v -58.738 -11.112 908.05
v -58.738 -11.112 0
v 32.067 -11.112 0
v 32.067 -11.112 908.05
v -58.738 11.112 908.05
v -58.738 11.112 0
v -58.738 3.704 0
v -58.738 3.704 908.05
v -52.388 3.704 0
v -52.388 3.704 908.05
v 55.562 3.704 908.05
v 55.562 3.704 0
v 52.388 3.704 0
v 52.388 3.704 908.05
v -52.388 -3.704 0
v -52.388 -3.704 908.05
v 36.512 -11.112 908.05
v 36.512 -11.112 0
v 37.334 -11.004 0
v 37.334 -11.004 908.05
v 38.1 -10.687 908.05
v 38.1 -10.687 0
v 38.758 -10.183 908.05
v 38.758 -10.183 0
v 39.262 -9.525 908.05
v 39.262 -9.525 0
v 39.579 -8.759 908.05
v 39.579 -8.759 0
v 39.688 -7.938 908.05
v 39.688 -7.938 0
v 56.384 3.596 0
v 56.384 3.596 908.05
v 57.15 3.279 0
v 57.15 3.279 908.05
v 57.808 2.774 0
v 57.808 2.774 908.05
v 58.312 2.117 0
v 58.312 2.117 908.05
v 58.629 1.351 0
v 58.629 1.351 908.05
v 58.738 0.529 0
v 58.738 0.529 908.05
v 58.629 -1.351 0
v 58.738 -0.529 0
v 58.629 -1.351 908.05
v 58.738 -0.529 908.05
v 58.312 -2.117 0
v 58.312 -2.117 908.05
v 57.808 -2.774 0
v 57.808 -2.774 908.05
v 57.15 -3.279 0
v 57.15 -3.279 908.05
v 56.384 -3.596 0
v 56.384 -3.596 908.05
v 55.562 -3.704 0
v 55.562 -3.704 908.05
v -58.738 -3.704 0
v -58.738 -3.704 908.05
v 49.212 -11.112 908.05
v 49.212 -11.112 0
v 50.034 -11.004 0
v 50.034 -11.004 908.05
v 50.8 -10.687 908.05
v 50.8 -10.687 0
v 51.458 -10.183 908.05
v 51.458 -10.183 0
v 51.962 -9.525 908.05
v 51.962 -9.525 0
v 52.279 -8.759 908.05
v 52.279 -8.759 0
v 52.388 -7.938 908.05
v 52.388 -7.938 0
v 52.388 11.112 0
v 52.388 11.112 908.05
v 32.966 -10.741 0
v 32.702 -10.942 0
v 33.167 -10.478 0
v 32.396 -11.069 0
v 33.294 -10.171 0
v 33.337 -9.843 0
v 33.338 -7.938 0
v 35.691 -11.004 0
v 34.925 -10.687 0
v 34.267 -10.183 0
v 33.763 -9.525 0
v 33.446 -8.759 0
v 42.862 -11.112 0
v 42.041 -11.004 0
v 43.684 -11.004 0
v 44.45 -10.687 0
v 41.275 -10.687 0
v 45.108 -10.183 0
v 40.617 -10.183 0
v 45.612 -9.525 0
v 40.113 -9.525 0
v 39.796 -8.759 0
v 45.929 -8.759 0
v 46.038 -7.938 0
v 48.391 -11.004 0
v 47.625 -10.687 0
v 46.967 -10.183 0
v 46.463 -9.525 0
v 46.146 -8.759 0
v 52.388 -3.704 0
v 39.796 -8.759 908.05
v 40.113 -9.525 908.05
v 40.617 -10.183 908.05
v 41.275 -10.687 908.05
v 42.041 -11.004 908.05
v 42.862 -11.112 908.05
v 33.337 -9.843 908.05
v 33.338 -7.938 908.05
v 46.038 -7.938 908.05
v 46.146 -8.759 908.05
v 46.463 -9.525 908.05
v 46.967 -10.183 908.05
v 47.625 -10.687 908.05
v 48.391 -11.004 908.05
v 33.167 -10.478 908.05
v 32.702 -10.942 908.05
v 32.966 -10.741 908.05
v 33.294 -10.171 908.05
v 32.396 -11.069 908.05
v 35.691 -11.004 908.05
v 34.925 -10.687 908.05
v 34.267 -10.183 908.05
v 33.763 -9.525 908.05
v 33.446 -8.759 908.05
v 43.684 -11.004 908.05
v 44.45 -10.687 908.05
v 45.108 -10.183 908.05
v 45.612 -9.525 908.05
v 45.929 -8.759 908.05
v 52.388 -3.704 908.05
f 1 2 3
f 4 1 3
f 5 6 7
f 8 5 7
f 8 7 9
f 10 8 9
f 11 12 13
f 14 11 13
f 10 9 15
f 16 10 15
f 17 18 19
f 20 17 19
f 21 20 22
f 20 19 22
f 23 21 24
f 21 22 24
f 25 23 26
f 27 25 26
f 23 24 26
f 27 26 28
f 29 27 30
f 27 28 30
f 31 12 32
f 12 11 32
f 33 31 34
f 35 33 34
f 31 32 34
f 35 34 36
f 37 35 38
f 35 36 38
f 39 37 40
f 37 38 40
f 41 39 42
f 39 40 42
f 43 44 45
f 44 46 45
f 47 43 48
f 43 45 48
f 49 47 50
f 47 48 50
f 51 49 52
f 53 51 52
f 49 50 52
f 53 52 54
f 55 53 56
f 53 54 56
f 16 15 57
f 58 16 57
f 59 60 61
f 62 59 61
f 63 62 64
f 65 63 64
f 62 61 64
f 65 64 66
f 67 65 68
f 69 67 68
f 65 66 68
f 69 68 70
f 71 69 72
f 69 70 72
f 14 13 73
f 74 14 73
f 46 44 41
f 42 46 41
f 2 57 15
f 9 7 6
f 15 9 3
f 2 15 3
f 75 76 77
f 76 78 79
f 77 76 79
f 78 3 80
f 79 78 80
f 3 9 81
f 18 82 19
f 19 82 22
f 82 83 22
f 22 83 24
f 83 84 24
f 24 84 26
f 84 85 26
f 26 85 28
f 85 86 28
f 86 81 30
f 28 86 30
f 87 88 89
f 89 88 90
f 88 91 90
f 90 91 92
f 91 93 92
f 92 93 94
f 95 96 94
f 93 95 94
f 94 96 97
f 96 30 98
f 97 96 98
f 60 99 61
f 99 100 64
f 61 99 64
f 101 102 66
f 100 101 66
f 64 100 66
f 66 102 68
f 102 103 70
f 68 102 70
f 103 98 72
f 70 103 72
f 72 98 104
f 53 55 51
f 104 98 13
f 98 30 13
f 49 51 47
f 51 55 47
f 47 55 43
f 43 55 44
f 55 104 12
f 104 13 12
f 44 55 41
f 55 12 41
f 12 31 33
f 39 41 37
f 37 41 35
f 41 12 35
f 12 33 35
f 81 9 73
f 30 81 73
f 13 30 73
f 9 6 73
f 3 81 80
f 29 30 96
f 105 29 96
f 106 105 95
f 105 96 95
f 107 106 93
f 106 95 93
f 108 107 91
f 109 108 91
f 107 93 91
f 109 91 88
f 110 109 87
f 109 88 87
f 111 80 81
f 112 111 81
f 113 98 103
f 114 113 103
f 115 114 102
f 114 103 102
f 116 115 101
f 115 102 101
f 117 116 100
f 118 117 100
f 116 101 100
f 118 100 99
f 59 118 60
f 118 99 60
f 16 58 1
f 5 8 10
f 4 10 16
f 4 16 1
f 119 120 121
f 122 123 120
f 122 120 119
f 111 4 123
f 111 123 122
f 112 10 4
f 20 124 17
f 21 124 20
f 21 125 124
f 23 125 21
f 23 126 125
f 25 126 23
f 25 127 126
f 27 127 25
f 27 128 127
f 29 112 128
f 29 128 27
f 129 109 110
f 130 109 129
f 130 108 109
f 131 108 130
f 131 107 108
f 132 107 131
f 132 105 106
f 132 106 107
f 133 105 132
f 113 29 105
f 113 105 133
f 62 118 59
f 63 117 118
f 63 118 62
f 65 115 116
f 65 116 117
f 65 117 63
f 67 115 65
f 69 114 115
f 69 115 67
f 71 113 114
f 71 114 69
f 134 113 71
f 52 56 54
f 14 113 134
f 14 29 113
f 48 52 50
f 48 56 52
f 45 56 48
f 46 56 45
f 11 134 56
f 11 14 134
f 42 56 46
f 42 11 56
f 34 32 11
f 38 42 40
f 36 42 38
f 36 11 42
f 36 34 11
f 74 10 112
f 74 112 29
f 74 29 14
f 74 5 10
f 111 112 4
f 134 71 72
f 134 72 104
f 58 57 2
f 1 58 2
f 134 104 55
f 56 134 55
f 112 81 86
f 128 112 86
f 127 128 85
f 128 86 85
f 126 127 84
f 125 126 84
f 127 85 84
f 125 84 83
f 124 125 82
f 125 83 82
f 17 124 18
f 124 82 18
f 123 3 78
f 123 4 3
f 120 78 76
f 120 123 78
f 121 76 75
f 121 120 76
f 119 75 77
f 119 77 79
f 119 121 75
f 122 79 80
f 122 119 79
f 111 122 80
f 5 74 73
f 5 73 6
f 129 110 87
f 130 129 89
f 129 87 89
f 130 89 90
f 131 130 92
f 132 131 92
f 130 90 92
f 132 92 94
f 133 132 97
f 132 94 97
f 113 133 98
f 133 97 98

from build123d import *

# Parameters (mm, degrees)
F1_DEPTH = 908.05
F2_R     = 1.27
F3_R     = 3.175


with BuildPart() as f1:
    # F0 (on Top) → F1 (new body)
    with BuildSketch(Plane.XY):
        with BuildLine():
            ThreePointArc((49.2125, -11.1125), (51.457564, -10.182564), (52.3875, -7.9375))
            Line((52.3875, -7.9375), (46.0375, -7.9375))
            ThreePointArc((46.0375, -7.9375), (46.967436, -10.182564), (49.2125, -11.1125))
        make_face()
        with BuildLine():
            ThreePointArc((42.8625, -11.1125), (45.107564, -10.182564), (46.0375, -7.9375))
            Line((46.0375, -7.9375), (39.6875, -7.9375))
            ThreePointArc((39.6875, -7.9375), (40.617436, -10.182564), (42.8625, -11.1125))
        make_face()
        with BuildLine():
            ThreePointArc((36.5125, -11.1125), (38.757564, -10.182564), (39.6875, -7.9375))
            Line((39.6875, -7.9375), (33.3375, -7.9375))
            ThreePointArc((33.3375, -7.9375), (34.267436, -10.182564), (36.5125, -11.1125))
        make_face()
        Polygon((52.3875, 3.704167), (52.3875, 11.1125), (-58.7375, 11.1125), (-58.7375, 3.704167), (-52.3875, 3.704167), (-52.3875, -3.704167), (-58.7375, -3.704167), (-58.7375, -11.1125), (33.3375, -11.1125), (33.3375, -7.9375), (39.6875, -7.9375), (46.0375, -7.9375), (52.3875, -7.9375), (52.3875, -3.704167), (58.7375, -3.704167), (58.7375, 3.704167), align=None)
    extrude(amount=F1_DEPTH)

    # F2
    f2_edges = [f1.edges().sort_by_distance(p)[0] for p in [
        (33.3375, -11.1125, 454.025),
    ]]
    fillet(f2_edges, radius=F2_R)

    # F3
    f3_edges = [f1.edges().sort_by_distance(p)[0] for p in [
        (58.7375, -3.704167, 454.025),
        (58.7375, 3.704167, 454.025),
    ]]
    fillet(f3_edges, radius=F3_R)


solid = f1.part
